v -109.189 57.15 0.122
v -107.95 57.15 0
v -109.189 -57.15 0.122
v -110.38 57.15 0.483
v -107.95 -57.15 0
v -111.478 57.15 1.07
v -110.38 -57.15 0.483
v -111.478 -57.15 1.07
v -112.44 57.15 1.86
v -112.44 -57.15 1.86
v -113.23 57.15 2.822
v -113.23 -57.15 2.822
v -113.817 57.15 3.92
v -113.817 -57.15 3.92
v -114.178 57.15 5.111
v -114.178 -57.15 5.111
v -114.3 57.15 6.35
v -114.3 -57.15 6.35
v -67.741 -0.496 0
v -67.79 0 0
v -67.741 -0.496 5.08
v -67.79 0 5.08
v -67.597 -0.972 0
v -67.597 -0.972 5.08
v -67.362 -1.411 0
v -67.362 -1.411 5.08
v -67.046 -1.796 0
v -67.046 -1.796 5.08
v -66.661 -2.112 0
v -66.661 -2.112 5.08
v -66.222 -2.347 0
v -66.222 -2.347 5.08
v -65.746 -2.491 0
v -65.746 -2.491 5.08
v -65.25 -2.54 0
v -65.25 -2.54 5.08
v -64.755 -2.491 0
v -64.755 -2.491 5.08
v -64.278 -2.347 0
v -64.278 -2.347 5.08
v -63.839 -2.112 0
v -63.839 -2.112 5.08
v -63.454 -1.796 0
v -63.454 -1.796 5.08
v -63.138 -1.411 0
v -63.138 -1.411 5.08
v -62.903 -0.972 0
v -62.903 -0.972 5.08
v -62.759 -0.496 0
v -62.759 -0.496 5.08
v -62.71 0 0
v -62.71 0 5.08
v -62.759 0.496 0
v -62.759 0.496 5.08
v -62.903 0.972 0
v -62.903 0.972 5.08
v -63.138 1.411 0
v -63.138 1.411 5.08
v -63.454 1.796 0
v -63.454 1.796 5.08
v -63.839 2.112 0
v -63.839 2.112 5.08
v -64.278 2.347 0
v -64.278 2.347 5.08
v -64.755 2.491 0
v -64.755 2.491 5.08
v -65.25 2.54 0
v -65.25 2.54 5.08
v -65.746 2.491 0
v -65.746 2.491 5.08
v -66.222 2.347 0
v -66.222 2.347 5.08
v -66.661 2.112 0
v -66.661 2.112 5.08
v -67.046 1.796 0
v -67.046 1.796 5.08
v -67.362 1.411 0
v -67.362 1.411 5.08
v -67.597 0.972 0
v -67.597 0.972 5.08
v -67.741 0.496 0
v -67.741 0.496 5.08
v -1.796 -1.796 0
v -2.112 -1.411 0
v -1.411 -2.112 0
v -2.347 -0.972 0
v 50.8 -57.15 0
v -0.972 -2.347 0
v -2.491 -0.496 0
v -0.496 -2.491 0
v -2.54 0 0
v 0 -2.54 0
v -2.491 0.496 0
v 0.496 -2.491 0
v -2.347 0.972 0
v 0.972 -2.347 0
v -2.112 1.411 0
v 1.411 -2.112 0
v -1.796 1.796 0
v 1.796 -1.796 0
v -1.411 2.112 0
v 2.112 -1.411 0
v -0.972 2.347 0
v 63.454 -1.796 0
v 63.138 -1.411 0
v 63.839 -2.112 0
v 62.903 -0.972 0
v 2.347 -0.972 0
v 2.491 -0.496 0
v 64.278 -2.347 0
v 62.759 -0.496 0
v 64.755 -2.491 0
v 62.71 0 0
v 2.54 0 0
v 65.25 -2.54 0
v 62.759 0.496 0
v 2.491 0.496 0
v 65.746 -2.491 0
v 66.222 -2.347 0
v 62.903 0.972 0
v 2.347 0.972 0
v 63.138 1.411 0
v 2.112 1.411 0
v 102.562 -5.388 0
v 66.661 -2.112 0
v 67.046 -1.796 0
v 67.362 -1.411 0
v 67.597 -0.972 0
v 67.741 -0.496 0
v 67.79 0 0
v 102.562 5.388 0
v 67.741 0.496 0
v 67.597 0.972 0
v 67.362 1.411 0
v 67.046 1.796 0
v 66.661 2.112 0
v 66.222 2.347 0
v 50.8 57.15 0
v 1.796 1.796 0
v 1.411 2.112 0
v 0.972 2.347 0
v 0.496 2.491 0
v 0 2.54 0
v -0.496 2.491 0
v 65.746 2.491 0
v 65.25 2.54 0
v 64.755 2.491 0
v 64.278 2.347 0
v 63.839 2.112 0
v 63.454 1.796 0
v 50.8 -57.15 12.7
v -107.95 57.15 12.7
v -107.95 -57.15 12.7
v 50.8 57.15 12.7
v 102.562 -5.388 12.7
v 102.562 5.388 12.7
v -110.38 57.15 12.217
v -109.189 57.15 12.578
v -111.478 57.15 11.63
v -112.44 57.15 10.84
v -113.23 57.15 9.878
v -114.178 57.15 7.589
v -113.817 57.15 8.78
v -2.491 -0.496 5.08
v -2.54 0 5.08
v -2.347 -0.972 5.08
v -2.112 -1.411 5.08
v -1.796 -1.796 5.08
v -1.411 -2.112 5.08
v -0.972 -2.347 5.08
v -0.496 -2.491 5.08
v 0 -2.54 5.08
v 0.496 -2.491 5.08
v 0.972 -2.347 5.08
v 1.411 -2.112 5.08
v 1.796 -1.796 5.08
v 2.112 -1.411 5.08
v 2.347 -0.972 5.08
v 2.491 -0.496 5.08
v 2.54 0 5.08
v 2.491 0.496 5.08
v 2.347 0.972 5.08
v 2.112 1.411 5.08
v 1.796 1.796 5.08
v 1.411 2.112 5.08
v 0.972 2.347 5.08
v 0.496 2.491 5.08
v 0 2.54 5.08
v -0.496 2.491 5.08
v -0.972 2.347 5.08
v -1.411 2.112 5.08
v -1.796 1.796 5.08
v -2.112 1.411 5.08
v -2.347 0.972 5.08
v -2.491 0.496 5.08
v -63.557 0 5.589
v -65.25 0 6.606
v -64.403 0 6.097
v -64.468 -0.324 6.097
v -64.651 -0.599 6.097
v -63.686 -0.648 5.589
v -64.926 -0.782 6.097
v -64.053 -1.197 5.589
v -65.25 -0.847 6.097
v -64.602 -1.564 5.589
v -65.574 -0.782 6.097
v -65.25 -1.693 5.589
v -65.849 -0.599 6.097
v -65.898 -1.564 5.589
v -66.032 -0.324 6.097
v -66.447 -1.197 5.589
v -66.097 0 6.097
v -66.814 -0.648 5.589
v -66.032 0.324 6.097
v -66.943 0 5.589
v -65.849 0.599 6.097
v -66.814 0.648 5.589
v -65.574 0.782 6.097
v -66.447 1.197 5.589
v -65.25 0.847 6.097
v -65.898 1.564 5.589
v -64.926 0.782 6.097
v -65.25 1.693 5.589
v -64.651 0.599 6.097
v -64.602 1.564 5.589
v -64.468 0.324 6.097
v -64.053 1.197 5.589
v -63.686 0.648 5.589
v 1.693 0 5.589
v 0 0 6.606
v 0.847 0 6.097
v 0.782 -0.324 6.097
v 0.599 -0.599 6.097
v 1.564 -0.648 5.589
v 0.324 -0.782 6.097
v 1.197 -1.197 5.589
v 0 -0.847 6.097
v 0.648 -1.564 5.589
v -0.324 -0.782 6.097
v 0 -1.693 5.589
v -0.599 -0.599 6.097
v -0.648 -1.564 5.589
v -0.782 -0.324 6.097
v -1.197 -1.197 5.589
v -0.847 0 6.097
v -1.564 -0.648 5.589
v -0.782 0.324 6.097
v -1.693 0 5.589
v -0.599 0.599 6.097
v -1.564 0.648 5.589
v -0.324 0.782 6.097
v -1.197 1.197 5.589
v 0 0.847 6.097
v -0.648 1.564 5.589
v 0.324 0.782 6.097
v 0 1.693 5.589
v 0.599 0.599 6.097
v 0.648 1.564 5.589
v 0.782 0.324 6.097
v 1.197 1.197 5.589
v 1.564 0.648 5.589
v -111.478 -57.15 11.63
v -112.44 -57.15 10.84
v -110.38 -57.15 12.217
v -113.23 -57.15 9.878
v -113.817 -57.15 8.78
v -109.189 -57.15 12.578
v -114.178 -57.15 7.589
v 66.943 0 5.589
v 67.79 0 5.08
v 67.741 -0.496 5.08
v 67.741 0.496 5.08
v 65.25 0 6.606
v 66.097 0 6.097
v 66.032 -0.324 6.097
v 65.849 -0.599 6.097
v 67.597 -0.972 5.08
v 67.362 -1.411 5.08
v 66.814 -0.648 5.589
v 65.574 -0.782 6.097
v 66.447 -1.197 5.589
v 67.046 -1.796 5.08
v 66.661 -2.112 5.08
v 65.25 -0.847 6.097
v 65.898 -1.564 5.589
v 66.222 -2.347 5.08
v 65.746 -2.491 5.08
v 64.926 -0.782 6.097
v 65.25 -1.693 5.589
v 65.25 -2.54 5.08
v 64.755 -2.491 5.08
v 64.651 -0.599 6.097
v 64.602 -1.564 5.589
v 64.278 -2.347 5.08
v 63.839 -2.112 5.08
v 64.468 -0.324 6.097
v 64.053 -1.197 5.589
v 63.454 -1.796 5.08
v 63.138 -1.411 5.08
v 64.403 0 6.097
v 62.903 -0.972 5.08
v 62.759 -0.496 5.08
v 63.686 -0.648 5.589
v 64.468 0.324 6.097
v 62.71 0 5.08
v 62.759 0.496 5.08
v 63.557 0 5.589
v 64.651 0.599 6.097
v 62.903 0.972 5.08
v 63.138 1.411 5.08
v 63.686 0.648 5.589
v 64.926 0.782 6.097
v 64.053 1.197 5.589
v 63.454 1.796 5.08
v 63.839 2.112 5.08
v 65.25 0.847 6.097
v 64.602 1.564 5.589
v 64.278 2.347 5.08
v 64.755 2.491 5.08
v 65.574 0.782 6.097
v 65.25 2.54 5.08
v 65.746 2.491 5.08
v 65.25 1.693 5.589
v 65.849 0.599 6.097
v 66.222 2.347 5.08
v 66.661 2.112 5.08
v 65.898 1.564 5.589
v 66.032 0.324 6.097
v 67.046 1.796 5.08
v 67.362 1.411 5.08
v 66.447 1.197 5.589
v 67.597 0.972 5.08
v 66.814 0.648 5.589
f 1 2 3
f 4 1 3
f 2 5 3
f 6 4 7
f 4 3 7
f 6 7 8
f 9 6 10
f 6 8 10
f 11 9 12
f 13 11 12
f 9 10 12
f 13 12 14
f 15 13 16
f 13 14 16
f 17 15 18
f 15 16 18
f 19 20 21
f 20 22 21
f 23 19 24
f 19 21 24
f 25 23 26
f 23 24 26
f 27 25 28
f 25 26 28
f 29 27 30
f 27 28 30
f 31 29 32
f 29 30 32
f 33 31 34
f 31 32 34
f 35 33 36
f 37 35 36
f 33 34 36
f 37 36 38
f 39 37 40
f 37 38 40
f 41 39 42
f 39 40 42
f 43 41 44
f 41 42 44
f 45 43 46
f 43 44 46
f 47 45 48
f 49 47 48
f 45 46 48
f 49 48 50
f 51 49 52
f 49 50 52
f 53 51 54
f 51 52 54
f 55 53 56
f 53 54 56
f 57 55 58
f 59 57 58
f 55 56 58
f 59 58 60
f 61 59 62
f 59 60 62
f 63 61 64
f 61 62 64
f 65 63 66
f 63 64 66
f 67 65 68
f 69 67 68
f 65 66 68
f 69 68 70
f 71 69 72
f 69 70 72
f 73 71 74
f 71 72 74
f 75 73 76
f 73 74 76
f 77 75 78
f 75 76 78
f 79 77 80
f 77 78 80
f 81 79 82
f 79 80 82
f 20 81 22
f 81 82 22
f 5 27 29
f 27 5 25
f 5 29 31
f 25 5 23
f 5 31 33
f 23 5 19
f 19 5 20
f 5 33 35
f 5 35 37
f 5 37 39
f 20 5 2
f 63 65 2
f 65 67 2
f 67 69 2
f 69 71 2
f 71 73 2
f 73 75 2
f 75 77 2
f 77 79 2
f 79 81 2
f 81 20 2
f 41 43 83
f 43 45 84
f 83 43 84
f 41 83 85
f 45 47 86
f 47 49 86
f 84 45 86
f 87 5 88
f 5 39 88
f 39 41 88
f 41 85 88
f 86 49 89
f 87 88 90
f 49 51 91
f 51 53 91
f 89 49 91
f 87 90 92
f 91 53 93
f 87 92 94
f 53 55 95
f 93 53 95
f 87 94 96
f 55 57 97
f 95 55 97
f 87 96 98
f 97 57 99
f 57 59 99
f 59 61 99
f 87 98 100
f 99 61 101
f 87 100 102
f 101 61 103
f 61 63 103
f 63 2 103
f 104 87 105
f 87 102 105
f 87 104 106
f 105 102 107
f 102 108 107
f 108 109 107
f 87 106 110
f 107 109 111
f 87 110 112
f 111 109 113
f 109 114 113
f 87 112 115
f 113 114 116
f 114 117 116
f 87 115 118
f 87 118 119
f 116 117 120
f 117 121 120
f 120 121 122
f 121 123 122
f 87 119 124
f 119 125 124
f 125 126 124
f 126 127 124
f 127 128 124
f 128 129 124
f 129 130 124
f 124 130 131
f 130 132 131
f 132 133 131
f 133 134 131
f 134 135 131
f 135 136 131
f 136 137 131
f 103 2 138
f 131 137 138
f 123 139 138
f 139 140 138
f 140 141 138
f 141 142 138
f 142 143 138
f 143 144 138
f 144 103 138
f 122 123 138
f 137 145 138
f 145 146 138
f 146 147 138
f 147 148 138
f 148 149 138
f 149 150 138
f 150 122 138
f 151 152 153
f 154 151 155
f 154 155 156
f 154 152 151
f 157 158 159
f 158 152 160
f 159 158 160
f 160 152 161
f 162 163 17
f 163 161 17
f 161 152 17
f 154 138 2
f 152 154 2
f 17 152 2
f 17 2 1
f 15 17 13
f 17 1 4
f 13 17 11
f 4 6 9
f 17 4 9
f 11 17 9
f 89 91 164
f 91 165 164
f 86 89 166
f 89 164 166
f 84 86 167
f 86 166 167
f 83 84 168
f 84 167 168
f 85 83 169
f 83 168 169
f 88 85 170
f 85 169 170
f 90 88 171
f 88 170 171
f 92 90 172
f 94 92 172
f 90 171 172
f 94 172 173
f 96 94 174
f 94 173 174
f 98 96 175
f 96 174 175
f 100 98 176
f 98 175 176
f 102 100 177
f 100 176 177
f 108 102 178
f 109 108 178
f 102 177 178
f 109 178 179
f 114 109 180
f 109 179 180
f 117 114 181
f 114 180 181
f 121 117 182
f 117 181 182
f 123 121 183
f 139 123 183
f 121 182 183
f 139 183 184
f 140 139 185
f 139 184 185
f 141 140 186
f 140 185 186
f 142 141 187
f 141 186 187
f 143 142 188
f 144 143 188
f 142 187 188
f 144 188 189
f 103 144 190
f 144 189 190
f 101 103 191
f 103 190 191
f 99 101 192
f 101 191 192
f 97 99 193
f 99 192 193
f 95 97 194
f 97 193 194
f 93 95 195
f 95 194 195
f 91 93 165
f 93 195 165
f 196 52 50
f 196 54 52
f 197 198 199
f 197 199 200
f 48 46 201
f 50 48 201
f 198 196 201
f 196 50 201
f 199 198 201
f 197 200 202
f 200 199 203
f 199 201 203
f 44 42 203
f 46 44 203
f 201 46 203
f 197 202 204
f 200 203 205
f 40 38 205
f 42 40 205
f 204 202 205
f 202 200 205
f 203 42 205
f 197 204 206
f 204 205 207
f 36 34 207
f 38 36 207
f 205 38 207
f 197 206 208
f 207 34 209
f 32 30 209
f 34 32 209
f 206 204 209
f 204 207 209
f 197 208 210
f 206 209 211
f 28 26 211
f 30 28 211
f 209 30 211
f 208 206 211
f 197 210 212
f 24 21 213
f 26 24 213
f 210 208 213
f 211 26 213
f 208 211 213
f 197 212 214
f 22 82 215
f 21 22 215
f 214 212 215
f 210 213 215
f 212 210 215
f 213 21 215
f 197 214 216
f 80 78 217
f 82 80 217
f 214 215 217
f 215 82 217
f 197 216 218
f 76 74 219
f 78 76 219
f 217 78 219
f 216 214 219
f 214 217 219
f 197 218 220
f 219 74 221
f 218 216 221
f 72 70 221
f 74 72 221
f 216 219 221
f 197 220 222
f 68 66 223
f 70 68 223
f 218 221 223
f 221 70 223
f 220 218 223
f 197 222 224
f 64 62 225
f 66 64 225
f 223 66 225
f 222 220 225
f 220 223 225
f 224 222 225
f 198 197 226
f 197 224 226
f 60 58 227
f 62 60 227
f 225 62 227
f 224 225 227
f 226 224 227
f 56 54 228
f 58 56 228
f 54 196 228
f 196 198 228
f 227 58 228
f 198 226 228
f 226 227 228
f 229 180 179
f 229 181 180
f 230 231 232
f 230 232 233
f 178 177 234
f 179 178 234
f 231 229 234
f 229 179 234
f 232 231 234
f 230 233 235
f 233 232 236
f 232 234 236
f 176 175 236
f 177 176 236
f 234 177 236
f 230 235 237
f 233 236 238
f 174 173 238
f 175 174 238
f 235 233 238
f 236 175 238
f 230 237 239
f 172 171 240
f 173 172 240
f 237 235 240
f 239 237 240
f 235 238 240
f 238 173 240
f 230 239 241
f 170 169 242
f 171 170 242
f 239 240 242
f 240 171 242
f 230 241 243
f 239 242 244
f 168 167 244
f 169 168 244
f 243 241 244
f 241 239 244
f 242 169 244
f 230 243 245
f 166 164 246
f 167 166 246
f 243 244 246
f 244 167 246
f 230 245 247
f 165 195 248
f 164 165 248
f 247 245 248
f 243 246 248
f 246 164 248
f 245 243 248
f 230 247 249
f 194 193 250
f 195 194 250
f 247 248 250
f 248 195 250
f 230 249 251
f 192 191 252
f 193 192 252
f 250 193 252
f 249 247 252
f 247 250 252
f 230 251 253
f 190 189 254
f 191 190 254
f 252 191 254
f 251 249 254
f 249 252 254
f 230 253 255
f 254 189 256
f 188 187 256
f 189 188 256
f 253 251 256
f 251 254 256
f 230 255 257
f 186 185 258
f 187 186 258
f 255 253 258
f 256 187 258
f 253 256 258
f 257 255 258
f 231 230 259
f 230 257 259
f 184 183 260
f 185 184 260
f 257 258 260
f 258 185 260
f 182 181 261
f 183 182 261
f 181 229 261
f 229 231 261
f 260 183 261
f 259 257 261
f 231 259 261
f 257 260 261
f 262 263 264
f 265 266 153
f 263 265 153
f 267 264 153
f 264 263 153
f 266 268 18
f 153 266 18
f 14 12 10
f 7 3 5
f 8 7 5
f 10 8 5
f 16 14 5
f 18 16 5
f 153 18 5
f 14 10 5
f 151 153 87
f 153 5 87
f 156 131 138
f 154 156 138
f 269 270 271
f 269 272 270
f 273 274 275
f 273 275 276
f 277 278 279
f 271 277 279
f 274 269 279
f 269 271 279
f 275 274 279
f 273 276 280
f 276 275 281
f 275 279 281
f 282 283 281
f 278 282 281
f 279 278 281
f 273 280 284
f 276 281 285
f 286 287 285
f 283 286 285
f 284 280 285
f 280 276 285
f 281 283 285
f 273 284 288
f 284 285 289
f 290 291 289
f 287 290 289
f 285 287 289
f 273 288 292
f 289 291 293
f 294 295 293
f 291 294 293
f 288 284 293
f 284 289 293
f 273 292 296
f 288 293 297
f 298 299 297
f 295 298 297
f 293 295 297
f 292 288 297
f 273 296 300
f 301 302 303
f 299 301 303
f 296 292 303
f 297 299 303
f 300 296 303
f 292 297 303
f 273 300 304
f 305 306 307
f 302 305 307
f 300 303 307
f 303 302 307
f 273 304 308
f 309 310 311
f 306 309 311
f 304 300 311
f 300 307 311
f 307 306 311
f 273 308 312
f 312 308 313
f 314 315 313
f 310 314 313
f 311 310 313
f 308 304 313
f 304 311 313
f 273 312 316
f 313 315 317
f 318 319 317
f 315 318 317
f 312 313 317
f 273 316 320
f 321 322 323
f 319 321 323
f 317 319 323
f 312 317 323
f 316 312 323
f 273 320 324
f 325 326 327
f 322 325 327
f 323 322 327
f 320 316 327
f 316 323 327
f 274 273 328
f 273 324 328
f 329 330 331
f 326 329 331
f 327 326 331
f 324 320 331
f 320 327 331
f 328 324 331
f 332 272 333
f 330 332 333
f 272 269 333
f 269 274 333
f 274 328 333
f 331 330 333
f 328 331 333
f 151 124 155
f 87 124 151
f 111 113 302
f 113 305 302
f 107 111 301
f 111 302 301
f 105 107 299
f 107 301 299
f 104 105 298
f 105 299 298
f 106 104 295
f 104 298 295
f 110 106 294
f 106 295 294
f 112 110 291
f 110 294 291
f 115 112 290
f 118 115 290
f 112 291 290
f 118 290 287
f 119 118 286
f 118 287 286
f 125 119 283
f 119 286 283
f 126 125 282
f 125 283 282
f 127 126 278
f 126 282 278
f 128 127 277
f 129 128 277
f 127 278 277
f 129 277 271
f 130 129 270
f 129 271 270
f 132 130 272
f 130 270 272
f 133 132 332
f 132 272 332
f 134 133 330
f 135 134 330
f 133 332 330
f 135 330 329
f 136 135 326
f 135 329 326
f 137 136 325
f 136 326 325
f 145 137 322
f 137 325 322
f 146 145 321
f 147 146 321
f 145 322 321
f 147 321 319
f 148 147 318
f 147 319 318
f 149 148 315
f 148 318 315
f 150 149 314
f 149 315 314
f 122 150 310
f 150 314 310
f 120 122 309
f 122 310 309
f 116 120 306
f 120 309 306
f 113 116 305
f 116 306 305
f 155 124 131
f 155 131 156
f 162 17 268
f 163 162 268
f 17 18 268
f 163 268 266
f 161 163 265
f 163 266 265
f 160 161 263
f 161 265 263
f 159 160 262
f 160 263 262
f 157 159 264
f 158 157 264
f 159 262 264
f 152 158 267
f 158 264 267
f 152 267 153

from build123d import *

# Parameters (mm, degrees)
F1_DEPTH    = 12.7
F2_D        = 5.08
F2_DEPTH    = 5.08
F2_TIP      = 1.5261859723
F3_D        = 5.08
F3_DEPTH    = 5.08
F3_TIP      = 1.5261859723
F4_T1_DEPTH = 339.3037394717
F5_SIZE     = 7.62
F6_R        = 6.34999


# Not quite as in the source:
# - a fillet or chamfer that OpenCascade refuses, or shapes differently, is made with other operations: its cross-section is extruded or revolved along the edge and cut away or added
# - a fillet or chamfer is up to 0.001 mm smaller than in the source, because OpenCascade refuses the exact size


with BuildPart() as f1:
    # F0 (on Top) → F1 (new body)
    with BuildSketch(Plane.XY):
        Polygon((114.3, 27.94), (114.3, 57.15), (82.55, 57.15), (-114.3, 57.15), (-114.3, -57.15), (82.55, -57.15), (114.3, -57.15), (114.3, -27.94), align=None)
    extrude(amount=F1_DEPTH)

    # F2
    with Locations(Plane(origin=(0, 0, 0), x_dir=(1, 0, 0), z_dir=(0, 0, -1))):
        with Locations((-65.25006, 0)):
            Hole(F2_D / 2, depth=F2_DEPTH)
            with Locations((0, 0, -(F2_DEPTH + F2_TIP / 2))):  # 118° drill point
                Cone(0, F2_D / 2, F2_TIP, mode=Mode.SUBTRACT)

    # F3
    with Locations(Plane(origin=(0, 0, 0), x_dir=(1, 0, 0), z_dir=(0, 0, -1))):
        with Locations((0, 0), (65.25006, 0)):
            Hole(F3_D / 2, depth=F3_DEPTH)
            with Locations((0, 0, -(F3_DEPTH + F3_TIP / 2))):  # 118° drill point
                Cone(0, F3_D / 2, F3_TIP, mode=Mode.SUBTRACT)

    # F4: chamfer of 63.5 on 2 edges, made by hand

    # F4_s2 → F4_t1 (cut)
    with BuildSketch(Plane.XY.offset(-163.3018697358)):
        Polygon((114.3, -6.35), (50.8, 57.15), (114.3, 57.15), align=None)
        Polygon((114.3, 6.35), (50.8, -57.15), (114.3, -57.15), align=None)
    extrude(amount=F4_T1_DEPTH, mode=Mode.SUBTRACT)

    # F5
    f5_edges = [f1.edges().sort_by_distance(p)[0] for p in [
        (107.95, 0, 6.35),
    ]]
    chamfer(f5_edges, length=F5_SIZE)

    # F6 (radius 6.35 in the source; OpenCascade refuses exactly that, so slightly less here)
    f6_edges = [f1.edges().sort_by_distance(p)[0] for p in [
        (-114.3, 0, 0),
        (-114.3, 0, 12.7),
    ]]
    fillet(f6_edges, radius=F6_R)


solid = f1.part
